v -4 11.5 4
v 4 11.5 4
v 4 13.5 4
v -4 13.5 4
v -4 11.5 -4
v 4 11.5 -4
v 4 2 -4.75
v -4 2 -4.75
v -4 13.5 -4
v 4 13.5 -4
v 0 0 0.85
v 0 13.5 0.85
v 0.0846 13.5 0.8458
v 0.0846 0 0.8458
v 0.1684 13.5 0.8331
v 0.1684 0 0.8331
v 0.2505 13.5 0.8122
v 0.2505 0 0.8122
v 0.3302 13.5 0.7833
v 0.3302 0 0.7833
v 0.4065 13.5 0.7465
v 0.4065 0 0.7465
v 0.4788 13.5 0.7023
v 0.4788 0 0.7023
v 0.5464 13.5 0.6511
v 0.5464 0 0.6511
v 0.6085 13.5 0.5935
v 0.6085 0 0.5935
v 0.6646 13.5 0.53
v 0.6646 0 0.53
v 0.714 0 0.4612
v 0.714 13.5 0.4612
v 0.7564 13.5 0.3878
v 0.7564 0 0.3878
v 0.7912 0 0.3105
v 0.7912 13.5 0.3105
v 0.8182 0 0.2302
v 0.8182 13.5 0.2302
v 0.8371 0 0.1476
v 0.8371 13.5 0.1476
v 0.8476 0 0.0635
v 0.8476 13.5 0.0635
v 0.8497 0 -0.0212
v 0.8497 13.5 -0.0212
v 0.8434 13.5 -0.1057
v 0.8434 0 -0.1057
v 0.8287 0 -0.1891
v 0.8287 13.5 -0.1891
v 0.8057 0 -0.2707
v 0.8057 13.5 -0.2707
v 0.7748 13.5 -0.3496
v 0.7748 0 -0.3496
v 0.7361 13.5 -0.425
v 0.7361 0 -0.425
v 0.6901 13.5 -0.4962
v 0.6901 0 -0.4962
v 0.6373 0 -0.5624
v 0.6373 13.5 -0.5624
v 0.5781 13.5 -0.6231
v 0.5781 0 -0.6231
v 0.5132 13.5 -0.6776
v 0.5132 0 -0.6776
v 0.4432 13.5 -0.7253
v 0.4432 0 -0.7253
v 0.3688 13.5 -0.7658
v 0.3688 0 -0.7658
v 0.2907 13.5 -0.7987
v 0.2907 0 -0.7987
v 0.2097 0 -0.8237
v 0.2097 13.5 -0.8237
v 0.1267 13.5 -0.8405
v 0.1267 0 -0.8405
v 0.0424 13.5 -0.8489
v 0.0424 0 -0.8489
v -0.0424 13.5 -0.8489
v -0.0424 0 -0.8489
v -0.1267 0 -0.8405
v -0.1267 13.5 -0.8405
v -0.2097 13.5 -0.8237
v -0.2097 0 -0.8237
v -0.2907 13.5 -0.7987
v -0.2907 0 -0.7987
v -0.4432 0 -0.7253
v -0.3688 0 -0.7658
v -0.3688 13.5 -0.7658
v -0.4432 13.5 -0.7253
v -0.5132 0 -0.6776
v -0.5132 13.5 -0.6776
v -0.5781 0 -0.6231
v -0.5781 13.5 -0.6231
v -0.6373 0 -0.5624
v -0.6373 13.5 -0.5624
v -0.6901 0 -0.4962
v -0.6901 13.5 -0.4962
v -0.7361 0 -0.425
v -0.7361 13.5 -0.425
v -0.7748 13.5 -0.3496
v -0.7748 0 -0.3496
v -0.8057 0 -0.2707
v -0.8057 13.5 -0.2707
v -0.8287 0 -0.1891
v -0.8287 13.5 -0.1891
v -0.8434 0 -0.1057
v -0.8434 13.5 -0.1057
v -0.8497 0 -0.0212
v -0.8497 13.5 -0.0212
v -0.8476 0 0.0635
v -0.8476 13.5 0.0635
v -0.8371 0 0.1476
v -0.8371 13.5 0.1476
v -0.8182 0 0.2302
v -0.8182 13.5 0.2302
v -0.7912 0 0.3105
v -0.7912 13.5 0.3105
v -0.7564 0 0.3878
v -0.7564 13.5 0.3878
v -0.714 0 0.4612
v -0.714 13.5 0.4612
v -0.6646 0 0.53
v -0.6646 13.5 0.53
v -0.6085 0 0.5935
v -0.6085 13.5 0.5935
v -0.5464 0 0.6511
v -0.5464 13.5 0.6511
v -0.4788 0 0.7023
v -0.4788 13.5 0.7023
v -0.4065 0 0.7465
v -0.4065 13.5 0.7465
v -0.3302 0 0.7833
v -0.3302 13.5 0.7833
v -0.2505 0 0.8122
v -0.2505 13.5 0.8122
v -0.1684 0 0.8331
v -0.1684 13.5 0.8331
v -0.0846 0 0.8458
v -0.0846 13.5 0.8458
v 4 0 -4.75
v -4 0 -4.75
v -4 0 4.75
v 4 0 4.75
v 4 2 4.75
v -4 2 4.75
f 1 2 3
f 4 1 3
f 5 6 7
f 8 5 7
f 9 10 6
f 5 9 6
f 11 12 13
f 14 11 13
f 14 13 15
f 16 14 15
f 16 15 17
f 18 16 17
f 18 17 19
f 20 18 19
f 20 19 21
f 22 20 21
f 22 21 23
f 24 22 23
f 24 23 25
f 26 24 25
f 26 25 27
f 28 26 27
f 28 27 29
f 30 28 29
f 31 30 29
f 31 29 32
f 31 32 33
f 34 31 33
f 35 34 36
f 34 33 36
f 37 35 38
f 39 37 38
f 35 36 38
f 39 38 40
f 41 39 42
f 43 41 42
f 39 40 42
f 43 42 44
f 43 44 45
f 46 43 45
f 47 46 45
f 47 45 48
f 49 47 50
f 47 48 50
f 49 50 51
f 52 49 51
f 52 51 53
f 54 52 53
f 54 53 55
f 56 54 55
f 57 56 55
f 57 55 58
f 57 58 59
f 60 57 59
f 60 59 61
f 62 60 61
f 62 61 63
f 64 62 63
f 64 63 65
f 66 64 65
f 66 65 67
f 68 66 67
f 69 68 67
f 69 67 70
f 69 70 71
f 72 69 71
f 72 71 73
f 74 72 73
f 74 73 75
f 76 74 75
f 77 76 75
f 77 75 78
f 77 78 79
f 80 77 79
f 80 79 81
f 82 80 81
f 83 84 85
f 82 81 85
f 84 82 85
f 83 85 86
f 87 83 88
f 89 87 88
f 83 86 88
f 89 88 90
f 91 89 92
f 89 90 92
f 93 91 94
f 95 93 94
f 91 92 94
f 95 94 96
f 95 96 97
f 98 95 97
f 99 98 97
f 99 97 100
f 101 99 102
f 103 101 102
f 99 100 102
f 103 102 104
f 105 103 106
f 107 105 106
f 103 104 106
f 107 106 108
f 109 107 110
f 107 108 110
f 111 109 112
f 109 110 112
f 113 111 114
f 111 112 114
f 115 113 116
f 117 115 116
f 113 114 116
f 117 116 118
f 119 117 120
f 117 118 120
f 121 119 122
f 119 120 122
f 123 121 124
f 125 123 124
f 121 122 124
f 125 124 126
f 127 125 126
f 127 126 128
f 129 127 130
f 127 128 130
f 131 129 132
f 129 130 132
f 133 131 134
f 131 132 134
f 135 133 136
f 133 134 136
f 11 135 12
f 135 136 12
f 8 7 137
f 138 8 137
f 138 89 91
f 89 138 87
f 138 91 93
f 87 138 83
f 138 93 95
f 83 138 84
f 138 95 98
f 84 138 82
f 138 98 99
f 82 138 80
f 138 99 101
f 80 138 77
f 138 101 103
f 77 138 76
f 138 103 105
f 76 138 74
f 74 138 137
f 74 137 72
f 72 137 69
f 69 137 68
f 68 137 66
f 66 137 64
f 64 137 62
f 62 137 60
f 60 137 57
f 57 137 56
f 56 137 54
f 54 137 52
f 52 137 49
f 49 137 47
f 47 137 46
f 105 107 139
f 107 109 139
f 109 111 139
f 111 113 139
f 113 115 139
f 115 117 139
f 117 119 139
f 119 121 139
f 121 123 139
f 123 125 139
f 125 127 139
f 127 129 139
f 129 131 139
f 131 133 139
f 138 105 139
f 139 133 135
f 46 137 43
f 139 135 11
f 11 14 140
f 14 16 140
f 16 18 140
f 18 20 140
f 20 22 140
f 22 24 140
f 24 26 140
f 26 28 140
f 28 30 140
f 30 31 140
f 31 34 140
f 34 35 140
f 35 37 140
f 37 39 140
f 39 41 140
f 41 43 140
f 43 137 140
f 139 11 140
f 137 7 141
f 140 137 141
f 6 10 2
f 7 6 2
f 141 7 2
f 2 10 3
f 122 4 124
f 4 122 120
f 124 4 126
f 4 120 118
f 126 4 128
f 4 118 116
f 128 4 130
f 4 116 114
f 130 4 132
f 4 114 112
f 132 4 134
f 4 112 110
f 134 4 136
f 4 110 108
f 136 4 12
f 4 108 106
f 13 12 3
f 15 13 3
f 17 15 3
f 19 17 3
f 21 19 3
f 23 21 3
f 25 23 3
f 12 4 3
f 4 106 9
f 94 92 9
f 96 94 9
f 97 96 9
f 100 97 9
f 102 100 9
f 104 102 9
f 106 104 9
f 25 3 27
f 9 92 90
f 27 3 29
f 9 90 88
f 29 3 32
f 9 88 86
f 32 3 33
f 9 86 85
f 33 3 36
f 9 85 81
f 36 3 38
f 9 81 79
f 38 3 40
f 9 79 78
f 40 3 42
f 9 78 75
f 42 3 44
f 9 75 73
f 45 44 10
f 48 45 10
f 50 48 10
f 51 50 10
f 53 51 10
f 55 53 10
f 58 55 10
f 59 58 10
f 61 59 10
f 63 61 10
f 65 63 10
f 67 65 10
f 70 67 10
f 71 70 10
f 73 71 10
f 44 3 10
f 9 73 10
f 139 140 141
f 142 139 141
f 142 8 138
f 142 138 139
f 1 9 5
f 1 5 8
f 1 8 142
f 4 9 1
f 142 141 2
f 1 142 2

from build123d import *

# Parameters (mm, degrees)
BOSS_EXTRUDE3_DEPTH      = 4
BOSS_EXTRUDE3_DEPTH_BACK = 4
SKETCH11_R               = 0.85
CUT_EXTRUDE5_DEPTH       = 15.859761102


with BuildPart() as part:
    # Sketch6 → Boss-Extrude3 (new, two sides: drawn at the far end of the back side and taken through both)
    with BuildSketch(Plane.ZY.offset(-BOSS_EXTRUDE3_DEPTH_BACK)):
        Polygon((-4.75, 2), (-4.75, 0), (4.75, 0), (4.75, 2), (4, 11.5), (4, 13.5), (-4, 13.5), (-4, 11.5), align=None)
    extrude(amount=BOSS_EXTRUDE3_DEPTH + BOSS_EXTRUDE3_DEPTH_BACK)

    # Sketch11 → Cut-Extrude5 (cut, through all)
    with BuildSketch(Plane(origin=(0, 13.5, 0), x_dir=(1, 0, 0), z_dir=(0, 1, 0))):
        with Locations(Location((0, 0, 0), (0, 0, 270))):
            Circle(SKETCH11_R)
    extrude(amount=-CUT_EXTRUDE5_DEPTH, mode=Mode.SUBTRACT)


solid = part.part
